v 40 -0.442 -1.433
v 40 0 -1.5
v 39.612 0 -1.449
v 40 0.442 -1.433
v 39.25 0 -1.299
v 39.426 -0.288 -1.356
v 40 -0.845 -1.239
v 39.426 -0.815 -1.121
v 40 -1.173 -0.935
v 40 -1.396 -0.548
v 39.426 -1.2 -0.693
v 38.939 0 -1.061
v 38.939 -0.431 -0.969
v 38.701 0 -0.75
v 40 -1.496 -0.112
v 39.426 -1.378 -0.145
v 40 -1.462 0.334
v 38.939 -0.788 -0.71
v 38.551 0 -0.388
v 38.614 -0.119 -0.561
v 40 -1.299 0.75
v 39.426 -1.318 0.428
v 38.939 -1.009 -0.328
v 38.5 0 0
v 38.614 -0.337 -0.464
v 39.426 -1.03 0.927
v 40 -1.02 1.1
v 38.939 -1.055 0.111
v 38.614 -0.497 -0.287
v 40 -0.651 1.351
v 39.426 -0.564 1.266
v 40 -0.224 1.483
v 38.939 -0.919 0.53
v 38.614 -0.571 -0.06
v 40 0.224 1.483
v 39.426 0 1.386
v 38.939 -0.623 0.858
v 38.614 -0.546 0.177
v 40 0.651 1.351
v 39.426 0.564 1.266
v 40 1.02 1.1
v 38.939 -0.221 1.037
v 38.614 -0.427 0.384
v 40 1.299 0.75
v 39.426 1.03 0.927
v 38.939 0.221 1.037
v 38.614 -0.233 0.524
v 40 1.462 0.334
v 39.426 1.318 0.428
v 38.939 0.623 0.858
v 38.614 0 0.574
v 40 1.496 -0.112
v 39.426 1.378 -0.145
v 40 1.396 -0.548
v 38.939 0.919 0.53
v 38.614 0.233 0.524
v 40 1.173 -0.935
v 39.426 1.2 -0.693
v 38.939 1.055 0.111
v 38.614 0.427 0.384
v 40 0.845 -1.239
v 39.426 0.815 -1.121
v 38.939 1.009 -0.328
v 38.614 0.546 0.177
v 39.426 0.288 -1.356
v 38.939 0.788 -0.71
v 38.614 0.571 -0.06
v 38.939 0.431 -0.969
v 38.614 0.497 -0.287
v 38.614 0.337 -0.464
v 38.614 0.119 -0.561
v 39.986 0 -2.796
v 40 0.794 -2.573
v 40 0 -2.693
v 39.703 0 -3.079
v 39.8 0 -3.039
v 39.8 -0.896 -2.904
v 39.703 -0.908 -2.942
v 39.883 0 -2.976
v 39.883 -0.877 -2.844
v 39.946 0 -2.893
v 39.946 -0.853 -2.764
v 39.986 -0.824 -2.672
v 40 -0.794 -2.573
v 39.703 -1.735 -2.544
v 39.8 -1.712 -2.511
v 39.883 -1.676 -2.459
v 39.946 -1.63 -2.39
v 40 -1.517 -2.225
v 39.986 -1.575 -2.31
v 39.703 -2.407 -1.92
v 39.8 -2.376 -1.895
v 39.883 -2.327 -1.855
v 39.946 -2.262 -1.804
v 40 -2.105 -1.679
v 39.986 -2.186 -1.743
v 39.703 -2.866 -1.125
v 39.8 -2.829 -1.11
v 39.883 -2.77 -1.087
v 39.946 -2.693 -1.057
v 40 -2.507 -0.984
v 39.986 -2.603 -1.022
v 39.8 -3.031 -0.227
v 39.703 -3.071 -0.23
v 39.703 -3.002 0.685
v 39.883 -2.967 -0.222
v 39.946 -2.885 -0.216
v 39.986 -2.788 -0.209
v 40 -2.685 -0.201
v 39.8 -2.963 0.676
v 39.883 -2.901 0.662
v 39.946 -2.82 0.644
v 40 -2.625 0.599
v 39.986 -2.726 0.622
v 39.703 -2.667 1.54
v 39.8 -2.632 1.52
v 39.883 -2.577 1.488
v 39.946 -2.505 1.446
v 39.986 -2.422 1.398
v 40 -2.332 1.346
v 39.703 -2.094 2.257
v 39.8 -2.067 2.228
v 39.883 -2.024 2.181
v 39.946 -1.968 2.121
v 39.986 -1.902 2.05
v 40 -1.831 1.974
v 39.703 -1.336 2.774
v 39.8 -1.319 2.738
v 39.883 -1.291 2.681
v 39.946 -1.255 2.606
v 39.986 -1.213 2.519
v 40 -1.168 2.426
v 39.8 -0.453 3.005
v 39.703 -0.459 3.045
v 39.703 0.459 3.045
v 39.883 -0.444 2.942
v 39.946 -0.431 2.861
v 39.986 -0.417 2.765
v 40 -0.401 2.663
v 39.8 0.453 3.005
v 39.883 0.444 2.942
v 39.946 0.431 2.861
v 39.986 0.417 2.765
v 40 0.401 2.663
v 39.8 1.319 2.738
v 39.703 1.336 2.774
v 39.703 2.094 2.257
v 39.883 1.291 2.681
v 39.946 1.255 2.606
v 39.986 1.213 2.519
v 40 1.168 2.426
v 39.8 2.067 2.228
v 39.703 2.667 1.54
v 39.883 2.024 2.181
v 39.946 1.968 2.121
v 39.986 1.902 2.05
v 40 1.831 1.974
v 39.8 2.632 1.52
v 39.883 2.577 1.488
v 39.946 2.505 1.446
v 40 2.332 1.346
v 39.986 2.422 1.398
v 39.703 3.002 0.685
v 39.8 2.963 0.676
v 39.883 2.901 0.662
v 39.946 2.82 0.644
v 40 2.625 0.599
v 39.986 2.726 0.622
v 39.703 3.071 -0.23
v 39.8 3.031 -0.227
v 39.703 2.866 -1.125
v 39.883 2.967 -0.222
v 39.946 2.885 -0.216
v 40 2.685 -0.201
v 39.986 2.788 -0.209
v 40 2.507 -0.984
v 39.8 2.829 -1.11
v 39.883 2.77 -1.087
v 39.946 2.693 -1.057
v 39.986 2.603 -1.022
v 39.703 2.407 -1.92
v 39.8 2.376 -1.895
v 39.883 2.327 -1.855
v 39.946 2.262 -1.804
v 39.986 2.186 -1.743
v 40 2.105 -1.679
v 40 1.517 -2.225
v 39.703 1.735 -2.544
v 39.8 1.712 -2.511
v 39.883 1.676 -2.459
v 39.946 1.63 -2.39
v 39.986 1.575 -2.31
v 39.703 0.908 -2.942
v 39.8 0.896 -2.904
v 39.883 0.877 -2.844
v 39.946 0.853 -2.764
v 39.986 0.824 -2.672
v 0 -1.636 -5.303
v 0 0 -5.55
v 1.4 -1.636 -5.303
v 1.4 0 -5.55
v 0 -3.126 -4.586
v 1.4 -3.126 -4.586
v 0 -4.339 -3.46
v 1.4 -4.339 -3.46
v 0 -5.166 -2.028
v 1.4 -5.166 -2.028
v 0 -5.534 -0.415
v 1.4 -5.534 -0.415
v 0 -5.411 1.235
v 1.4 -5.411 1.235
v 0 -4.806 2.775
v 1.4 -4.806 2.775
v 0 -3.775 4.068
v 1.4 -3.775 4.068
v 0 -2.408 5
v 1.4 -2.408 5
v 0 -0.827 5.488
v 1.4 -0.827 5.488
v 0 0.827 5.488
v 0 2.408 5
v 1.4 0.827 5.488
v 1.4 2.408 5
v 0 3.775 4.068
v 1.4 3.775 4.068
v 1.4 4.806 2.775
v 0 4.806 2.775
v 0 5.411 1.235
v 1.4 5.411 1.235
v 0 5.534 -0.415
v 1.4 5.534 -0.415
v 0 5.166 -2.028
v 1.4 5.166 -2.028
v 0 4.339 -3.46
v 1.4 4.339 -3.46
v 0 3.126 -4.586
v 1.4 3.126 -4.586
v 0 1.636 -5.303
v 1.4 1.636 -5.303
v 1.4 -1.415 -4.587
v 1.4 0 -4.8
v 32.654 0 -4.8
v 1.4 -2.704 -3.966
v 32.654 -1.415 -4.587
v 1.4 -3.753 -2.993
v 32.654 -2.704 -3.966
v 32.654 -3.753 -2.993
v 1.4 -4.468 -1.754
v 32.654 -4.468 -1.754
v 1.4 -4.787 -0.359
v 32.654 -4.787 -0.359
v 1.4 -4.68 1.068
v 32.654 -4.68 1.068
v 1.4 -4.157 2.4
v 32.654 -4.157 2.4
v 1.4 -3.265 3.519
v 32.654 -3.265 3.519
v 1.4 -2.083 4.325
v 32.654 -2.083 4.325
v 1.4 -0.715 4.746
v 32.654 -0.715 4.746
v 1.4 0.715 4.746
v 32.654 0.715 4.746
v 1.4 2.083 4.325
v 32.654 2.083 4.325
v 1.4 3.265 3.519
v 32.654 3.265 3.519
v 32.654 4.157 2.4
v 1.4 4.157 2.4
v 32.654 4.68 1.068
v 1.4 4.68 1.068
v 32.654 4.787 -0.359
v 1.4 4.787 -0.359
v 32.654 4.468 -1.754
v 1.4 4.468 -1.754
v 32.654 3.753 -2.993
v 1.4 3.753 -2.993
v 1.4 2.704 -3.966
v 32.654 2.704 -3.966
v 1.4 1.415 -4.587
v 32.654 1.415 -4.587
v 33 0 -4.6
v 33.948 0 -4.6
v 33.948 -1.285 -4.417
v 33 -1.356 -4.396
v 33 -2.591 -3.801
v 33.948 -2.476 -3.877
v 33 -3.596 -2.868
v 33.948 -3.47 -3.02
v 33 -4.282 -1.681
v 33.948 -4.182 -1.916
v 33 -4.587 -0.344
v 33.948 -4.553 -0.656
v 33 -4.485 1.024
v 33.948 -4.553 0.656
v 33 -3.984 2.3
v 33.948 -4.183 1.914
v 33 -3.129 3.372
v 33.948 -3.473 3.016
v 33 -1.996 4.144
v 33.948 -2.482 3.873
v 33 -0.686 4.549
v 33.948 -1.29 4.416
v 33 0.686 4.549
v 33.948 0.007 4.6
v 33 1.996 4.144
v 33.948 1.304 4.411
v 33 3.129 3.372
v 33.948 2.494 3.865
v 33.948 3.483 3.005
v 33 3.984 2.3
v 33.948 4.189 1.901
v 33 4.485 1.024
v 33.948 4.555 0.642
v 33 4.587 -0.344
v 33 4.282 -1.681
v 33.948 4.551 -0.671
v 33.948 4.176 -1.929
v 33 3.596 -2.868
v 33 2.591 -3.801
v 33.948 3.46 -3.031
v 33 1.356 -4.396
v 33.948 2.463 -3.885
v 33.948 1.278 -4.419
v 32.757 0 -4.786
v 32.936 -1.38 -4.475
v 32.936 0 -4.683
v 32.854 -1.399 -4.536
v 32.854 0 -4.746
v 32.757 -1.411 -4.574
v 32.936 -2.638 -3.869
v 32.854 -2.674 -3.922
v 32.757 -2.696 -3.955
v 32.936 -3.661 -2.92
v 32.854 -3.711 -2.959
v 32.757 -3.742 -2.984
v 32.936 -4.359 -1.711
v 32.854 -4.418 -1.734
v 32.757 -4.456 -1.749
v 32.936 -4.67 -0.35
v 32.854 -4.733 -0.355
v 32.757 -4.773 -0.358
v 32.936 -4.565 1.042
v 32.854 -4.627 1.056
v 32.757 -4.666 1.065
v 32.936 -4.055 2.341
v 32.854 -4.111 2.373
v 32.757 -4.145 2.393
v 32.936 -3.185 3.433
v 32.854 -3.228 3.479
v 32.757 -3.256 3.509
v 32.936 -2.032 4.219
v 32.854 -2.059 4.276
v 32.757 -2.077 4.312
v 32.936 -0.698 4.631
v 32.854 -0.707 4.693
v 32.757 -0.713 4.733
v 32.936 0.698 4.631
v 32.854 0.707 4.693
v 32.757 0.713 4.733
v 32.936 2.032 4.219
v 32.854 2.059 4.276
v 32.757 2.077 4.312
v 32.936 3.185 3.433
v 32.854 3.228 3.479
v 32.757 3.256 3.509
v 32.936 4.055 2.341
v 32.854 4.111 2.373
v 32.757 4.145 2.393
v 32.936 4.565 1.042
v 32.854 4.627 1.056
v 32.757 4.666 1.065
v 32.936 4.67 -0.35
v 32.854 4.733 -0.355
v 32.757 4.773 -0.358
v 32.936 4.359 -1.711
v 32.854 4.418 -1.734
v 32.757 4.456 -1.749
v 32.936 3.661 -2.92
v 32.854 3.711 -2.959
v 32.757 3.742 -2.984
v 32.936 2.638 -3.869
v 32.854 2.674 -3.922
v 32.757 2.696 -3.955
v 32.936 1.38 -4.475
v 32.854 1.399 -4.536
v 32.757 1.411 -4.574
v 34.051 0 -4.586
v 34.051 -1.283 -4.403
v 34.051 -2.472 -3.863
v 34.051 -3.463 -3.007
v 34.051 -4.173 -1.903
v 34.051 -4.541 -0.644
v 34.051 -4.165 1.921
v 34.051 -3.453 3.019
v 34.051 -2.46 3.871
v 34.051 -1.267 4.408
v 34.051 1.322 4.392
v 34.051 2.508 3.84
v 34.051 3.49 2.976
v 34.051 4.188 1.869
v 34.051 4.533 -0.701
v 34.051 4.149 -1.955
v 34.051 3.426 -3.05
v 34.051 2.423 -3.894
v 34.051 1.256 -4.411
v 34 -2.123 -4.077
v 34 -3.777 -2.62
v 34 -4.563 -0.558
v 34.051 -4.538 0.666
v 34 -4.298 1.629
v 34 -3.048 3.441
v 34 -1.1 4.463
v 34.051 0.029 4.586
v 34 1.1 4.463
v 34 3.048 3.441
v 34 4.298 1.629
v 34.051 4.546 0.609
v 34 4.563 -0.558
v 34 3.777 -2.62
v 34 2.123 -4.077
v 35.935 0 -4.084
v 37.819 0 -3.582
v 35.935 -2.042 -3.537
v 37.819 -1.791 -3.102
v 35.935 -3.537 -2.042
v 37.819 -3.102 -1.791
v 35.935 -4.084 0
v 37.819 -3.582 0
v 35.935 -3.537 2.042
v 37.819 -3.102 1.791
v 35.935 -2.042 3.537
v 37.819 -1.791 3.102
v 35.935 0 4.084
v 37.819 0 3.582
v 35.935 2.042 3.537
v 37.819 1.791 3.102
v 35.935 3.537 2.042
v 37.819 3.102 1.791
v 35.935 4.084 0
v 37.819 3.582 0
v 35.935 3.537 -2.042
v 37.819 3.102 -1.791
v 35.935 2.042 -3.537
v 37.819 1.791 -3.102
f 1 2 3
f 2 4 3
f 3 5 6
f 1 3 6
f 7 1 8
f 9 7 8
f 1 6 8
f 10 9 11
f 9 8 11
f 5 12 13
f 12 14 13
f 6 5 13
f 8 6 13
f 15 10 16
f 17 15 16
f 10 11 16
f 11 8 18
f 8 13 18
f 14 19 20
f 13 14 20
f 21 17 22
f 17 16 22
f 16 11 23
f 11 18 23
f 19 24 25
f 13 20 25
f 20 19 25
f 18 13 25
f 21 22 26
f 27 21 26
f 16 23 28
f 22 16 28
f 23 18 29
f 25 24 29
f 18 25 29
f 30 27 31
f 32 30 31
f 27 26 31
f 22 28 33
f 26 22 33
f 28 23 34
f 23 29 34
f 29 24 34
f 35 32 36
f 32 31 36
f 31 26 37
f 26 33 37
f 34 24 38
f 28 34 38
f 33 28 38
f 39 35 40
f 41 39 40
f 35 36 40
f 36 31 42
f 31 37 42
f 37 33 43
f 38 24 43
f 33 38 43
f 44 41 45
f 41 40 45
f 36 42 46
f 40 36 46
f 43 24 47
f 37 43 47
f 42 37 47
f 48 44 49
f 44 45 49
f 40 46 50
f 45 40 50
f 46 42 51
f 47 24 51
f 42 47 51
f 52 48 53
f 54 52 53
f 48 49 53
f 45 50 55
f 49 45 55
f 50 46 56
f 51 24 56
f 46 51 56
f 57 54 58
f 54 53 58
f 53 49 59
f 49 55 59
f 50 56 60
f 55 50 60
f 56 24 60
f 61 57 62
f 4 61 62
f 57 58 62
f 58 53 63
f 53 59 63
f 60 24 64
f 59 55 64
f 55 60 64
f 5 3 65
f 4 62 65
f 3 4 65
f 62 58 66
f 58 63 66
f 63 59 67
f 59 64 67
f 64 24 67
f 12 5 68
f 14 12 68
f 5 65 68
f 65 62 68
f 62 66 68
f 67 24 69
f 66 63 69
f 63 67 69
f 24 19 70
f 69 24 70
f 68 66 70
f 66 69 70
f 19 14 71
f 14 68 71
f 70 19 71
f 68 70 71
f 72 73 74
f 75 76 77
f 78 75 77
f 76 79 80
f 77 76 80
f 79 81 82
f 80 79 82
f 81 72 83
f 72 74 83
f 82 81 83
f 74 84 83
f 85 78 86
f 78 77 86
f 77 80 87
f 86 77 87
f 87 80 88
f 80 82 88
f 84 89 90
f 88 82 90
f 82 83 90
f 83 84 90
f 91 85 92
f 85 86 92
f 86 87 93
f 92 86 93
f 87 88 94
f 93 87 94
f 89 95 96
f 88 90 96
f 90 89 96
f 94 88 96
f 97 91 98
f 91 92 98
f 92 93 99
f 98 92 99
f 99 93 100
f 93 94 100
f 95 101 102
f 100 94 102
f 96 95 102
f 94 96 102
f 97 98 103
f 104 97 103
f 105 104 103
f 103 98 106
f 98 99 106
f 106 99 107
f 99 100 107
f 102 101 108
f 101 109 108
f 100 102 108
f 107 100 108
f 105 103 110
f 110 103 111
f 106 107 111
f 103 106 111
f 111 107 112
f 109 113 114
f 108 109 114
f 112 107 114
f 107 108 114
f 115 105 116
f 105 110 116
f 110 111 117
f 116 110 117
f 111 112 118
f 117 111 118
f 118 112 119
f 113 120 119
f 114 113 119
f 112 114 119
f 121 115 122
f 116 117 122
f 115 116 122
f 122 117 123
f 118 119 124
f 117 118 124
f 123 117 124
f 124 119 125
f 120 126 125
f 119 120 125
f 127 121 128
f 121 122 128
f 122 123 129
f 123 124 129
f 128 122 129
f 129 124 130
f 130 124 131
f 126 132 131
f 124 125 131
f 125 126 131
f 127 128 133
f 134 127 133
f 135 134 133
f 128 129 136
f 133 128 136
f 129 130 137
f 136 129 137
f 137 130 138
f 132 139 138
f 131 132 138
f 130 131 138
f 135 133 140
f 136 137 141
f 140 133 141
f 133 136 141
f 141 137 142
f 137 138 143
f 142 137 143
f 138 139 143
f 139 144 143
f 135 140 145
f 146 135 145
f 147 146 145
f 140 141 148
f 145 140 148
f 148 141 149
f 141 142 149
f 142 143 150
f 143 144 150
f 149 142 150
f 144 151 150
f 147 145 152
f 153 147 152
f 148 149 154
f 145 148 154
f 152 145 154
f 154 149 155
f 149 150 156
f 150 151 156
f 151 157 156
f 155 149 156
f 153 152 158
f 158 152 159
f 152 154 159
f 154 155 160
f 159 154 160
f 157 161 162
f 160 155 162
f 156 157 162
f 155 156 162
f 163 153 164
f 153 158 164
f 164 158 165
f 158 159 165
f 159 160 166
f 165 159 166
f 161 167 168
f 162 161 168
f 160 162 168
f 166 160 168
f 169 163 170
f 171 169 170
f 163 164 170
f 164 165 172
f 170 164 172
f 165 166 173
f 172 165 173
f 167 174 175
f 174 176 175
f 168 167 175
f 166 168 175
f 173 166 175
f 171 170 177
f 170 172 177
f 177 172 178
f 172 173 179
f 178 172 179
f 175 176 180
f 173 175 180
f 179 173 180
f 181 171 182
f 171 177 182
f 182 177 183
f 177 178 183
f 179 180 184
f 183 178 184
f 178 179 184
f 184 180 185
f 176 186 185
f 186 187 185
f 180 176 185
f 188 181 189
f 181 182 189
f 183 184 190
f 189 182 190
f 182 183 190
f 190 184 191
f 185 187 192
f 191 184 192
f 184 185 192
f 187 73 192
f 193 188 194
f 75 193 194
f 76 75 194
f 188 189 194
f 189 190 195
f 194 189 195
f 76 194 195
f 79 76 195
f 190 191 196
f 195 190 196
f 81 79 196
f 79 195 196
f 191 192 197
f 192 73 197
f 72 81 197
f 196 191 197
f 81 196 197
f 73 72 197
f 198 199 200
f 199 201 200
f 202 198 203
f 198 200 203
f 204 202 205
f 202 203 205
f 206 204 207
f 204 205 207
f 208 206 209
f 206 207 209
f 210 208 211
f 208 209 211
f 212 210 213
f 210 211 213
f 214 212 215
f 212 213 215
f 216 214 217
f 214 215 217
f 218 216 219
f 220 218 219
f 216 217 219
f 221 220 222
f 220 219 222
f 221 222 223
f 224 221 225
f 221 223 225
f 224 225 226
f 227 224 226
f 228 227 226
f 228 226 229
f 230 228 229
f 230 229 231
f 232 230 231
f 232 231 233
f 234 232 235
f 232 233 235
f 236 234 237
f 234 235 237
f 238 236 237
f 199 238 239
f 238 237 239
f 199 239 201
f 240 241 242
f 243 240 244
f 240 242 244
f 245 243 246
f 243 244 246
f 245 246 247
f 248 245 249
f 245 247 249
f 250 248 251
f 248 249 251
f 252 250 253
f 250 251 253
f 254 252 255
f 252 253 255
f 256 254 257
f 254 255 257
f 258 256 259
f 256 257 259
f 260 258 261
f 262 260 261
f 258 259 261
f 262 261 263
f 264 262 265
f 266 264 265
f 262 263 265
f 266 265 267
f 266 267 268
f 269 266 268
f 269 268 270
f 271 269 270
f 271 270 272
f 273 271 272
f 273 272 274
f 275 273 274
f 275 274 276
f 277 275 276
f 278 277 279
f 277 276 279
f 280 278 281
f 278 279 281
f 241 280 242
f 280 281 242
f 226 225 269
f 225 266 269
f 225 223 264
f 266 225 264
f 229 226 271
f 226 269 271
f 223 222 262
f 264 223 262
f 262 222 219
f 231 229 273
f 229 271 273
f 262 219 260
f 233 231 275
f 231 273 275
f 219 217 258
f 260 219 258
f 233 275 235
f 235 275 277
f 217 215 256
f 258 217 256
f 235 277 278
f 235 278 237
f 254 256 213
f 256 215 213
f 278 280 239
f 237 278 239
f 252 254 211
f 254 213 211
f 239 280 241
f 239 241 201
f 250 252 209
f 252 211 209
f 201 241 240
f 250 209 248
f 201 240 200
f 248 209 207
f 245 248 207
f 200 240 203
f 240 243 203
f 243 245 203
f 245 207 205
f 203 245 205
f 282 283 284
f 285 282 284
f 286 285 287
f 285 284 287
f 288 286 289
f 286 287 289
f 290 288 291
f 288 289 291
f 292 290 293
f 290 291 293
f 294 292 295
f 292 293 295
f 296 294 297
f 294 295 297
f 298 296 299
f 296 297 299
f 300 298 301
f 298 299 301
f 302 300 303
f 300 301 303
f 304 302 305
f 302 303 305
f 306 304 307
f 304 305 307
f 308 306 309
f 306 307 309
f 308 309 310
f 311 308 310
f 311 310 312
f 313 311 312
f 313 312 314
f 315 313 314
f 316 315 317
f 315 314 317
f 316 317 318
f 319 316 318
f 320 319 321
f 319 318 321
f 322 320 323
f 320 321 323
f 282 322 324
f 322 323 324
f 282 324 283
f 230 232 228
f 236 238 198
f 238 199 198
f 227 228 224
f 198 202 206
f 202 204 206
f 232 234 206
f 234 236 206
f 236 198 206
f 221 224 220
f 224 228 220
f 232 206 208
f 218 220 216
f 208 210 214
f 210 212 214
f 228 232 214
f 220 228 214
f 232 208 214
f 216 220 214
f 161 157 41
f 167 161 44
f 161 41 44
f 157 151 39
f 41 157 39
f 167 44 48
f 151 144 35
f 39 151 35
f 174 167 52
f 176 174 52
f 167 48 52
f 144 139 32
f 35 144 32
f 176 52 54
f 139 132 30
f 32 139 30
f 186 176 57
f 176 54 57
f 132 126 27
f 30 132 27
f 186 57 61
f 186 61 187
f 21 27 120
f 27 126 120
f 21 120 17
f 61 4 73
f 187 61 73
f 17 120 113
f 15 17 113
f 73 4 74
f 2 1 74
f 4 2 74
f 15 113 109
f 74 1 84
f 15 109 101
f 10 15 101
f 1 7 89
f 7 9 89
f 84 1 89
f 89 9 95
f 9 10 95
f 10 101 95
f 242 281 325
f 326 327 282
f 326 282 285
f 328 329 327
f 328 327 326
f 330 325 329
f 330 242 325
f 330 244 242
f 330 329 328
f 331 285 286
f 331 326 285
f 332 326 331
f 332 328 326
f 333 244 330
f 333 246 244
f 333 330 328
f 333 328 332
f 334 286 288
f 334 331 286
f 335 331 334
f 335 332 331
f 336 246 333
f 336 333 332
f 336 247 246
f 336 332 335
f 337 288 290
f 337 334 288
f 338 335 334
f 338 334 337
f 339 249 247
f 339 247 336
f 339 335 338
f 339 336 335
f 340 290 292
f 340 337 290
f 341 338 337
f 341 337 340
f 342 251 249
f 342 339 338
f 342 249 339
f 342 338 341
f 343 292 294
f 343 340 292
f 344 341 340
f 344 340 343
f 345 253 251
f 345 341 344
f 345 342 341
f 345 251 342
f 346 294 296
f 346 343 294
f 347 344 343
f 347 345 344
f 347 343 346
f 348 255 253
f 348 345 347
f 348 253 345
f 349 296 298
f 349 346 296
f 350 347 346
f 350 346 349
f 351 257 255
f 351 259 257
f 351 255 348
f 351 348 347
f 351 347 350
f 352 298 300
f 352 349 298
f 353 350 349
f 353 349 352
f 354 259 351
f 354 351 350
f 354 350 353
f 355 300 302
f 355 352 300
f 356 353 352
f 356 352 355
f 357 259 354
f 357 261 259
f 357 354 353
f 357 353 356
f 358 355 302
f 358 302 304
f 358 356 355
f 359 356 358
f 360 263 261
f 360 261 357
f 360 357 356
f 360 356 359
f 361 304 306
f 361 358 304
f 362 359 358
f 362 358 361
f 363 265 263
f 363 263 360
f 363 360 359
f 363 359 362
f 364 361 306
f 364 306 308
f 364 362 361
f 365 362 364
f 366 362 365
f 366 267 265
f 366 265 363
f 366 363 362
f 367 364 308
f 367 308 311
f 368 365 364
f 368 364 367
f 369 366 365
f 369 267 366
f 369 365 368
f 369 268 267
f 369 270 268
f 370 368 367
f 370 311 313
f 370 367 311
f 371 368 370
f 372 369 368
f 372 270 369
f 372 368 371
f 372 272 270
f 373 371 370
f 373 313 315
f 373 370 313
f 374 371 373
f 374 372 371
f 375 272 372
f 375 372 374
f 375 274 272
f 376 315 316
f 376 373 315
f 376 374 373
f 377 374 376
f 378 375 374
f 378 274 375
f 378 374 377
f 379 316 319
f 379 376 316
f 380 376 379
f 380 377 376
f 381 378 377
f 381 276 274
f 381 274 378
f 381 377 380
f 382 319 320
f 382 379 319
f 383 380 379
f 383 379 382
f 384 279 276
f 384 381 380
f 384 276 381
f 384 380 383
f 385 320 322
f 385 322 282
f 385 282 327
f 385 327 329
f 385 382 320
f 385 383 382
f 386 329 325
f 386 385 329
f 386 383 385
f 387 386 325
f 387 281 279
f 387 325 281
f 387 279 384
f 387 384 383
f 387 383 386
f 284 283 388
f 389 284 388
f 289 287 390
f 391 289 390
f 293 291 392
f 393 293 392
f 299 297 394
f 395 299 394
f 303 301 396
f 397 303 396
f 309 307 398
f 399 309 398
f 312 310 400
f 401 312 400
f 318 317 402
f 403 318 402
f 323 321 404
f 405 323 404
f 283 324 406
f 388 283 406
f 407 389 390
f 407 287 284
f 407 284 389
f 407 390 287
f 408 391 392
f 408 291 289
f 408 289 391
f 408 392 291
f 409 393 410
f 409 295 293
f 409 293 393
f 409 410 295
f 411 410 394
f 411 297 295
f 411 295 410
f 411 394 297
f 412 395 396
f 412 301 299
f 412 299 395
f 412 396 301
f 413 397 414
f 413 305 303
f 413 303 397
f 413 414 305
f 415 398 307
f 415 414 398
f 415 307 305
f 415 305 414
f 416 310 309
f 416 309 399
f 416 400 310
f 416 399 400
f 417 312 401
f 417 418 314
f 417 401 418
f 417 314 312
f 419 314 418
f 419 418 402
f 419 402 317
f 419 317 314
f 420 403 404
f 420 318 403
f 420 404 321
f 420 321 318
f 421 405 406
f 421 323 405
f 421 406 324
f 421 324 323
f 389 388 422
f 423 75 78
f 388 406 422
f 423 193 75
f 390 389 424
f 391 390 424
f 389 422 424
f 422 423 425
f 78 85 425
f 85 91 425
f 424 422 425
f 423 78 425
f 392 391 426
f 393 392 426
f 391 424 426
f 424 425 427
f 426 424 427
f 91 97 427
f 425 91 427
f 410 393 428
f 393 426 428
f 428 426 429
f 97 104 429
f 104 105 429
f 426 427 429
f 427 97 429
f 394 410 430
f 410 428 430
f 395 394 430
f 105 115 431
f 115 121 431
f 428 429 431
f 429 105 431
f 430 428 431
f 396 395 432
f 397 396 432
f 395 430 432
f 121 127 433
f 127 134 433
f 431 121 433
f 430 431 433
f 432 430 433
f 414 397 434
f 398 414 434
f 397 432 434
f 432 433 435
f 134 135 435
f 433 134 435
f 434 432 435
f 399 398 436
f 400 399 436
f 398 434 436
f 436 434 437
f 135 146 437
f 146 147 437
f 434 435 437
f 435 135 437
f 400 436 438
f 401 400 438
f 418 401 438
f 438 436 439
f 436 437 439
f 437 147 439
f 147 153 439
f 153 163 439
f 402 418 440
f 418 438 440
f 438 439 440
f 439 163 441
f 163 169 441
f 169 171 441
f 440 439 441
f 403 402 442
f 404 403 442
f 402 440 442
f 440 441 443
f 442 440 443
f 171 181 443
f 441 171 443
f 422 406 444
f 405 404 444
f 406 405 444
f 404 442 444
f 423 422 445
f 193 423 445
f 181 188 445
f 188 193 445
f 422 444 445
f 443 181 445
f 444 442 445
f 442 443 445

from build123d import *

# Parameters (mm, degrees)
FILETE1_R = 0.4
FILETE2_R = 0.4
FILETE3_R = 0.4


with BuildPart() as part:
    # Esboço1 → Revolução1 (revolve)
    with BuildSketch(Plane.XY, mode=Mode.PRIVATE) as revolu_o1_sk:
        with BuildLine():
            Line((0, 0), (0, 5.55))
            Line((0, 5.55), (1.4, 5.55))
            Line((1.4, 5.55), (1.4, 4.8))
            Line((1.4, 4.8), (33, 4.8))
            Line((33, 4.8), (33, 4.6))
            Line((33, 4.6), (34, 4.6))
            Line((34, 4.6), (40, 3))
            Line((40, 3), (40, 1.5))
            ThreePointArc((40, 1.5), (38.939339828, 1.060660172), (38.5, 0))
            Line((38.5, 0), (0, 0))
        make_face()
    revolve(revolu_o1_sk.sketch.rotate(Axis((38.5, 0, 0), (-1, 0, 0)), 90), axis=Axis((38.5, 0, 0), (-1, 0, 0)))

    # Filete1
    # the kernel refuses this fillet: 0.4 mm, written as the material it takes off along each edge
    with BuildSketch(Plane(origin=(33, 0, 0), x_dir=(0, 0, -1), z_dir=(0, 1, 0))) as filete1_piece_1:
        with BuildLine():
            CenterArc((4.4, 0.346410162), FILETE1_R, 300, 60)
            Line((4.6, 0), (4.604, -0.006928203))
            ThreePointArc((4.604, -0.006928203), (4.7, -0.008), (4.8, -0.008))
            Line((4.8, -0.008), (4.808, 0))
            Line((4.808, 0), (4.808, 0.346410162))
            Line((4.808, 0.346410162), (4.8, 0.346410162))
        make_face()
    revolve(axis=Axis((33, 0, 0), (-1, 0, 0)), mode=Mode.SUBTRACT)

    # Filete2
    filete2_edges = [part.edges().sort_by_distance(p)[0] for p in [
        (34, 0, 4.6),
    ]]
    fillet(filete2_edges, radius=FILETE2_R)

    # Filete3
    filete3_edges = [part.edges().sort_by_distance(p)[0] for p in [
        (40, 0, 3),
    ]]
    fillet(filete3_edges, radius=FILETE3_R)


solid = part.part
